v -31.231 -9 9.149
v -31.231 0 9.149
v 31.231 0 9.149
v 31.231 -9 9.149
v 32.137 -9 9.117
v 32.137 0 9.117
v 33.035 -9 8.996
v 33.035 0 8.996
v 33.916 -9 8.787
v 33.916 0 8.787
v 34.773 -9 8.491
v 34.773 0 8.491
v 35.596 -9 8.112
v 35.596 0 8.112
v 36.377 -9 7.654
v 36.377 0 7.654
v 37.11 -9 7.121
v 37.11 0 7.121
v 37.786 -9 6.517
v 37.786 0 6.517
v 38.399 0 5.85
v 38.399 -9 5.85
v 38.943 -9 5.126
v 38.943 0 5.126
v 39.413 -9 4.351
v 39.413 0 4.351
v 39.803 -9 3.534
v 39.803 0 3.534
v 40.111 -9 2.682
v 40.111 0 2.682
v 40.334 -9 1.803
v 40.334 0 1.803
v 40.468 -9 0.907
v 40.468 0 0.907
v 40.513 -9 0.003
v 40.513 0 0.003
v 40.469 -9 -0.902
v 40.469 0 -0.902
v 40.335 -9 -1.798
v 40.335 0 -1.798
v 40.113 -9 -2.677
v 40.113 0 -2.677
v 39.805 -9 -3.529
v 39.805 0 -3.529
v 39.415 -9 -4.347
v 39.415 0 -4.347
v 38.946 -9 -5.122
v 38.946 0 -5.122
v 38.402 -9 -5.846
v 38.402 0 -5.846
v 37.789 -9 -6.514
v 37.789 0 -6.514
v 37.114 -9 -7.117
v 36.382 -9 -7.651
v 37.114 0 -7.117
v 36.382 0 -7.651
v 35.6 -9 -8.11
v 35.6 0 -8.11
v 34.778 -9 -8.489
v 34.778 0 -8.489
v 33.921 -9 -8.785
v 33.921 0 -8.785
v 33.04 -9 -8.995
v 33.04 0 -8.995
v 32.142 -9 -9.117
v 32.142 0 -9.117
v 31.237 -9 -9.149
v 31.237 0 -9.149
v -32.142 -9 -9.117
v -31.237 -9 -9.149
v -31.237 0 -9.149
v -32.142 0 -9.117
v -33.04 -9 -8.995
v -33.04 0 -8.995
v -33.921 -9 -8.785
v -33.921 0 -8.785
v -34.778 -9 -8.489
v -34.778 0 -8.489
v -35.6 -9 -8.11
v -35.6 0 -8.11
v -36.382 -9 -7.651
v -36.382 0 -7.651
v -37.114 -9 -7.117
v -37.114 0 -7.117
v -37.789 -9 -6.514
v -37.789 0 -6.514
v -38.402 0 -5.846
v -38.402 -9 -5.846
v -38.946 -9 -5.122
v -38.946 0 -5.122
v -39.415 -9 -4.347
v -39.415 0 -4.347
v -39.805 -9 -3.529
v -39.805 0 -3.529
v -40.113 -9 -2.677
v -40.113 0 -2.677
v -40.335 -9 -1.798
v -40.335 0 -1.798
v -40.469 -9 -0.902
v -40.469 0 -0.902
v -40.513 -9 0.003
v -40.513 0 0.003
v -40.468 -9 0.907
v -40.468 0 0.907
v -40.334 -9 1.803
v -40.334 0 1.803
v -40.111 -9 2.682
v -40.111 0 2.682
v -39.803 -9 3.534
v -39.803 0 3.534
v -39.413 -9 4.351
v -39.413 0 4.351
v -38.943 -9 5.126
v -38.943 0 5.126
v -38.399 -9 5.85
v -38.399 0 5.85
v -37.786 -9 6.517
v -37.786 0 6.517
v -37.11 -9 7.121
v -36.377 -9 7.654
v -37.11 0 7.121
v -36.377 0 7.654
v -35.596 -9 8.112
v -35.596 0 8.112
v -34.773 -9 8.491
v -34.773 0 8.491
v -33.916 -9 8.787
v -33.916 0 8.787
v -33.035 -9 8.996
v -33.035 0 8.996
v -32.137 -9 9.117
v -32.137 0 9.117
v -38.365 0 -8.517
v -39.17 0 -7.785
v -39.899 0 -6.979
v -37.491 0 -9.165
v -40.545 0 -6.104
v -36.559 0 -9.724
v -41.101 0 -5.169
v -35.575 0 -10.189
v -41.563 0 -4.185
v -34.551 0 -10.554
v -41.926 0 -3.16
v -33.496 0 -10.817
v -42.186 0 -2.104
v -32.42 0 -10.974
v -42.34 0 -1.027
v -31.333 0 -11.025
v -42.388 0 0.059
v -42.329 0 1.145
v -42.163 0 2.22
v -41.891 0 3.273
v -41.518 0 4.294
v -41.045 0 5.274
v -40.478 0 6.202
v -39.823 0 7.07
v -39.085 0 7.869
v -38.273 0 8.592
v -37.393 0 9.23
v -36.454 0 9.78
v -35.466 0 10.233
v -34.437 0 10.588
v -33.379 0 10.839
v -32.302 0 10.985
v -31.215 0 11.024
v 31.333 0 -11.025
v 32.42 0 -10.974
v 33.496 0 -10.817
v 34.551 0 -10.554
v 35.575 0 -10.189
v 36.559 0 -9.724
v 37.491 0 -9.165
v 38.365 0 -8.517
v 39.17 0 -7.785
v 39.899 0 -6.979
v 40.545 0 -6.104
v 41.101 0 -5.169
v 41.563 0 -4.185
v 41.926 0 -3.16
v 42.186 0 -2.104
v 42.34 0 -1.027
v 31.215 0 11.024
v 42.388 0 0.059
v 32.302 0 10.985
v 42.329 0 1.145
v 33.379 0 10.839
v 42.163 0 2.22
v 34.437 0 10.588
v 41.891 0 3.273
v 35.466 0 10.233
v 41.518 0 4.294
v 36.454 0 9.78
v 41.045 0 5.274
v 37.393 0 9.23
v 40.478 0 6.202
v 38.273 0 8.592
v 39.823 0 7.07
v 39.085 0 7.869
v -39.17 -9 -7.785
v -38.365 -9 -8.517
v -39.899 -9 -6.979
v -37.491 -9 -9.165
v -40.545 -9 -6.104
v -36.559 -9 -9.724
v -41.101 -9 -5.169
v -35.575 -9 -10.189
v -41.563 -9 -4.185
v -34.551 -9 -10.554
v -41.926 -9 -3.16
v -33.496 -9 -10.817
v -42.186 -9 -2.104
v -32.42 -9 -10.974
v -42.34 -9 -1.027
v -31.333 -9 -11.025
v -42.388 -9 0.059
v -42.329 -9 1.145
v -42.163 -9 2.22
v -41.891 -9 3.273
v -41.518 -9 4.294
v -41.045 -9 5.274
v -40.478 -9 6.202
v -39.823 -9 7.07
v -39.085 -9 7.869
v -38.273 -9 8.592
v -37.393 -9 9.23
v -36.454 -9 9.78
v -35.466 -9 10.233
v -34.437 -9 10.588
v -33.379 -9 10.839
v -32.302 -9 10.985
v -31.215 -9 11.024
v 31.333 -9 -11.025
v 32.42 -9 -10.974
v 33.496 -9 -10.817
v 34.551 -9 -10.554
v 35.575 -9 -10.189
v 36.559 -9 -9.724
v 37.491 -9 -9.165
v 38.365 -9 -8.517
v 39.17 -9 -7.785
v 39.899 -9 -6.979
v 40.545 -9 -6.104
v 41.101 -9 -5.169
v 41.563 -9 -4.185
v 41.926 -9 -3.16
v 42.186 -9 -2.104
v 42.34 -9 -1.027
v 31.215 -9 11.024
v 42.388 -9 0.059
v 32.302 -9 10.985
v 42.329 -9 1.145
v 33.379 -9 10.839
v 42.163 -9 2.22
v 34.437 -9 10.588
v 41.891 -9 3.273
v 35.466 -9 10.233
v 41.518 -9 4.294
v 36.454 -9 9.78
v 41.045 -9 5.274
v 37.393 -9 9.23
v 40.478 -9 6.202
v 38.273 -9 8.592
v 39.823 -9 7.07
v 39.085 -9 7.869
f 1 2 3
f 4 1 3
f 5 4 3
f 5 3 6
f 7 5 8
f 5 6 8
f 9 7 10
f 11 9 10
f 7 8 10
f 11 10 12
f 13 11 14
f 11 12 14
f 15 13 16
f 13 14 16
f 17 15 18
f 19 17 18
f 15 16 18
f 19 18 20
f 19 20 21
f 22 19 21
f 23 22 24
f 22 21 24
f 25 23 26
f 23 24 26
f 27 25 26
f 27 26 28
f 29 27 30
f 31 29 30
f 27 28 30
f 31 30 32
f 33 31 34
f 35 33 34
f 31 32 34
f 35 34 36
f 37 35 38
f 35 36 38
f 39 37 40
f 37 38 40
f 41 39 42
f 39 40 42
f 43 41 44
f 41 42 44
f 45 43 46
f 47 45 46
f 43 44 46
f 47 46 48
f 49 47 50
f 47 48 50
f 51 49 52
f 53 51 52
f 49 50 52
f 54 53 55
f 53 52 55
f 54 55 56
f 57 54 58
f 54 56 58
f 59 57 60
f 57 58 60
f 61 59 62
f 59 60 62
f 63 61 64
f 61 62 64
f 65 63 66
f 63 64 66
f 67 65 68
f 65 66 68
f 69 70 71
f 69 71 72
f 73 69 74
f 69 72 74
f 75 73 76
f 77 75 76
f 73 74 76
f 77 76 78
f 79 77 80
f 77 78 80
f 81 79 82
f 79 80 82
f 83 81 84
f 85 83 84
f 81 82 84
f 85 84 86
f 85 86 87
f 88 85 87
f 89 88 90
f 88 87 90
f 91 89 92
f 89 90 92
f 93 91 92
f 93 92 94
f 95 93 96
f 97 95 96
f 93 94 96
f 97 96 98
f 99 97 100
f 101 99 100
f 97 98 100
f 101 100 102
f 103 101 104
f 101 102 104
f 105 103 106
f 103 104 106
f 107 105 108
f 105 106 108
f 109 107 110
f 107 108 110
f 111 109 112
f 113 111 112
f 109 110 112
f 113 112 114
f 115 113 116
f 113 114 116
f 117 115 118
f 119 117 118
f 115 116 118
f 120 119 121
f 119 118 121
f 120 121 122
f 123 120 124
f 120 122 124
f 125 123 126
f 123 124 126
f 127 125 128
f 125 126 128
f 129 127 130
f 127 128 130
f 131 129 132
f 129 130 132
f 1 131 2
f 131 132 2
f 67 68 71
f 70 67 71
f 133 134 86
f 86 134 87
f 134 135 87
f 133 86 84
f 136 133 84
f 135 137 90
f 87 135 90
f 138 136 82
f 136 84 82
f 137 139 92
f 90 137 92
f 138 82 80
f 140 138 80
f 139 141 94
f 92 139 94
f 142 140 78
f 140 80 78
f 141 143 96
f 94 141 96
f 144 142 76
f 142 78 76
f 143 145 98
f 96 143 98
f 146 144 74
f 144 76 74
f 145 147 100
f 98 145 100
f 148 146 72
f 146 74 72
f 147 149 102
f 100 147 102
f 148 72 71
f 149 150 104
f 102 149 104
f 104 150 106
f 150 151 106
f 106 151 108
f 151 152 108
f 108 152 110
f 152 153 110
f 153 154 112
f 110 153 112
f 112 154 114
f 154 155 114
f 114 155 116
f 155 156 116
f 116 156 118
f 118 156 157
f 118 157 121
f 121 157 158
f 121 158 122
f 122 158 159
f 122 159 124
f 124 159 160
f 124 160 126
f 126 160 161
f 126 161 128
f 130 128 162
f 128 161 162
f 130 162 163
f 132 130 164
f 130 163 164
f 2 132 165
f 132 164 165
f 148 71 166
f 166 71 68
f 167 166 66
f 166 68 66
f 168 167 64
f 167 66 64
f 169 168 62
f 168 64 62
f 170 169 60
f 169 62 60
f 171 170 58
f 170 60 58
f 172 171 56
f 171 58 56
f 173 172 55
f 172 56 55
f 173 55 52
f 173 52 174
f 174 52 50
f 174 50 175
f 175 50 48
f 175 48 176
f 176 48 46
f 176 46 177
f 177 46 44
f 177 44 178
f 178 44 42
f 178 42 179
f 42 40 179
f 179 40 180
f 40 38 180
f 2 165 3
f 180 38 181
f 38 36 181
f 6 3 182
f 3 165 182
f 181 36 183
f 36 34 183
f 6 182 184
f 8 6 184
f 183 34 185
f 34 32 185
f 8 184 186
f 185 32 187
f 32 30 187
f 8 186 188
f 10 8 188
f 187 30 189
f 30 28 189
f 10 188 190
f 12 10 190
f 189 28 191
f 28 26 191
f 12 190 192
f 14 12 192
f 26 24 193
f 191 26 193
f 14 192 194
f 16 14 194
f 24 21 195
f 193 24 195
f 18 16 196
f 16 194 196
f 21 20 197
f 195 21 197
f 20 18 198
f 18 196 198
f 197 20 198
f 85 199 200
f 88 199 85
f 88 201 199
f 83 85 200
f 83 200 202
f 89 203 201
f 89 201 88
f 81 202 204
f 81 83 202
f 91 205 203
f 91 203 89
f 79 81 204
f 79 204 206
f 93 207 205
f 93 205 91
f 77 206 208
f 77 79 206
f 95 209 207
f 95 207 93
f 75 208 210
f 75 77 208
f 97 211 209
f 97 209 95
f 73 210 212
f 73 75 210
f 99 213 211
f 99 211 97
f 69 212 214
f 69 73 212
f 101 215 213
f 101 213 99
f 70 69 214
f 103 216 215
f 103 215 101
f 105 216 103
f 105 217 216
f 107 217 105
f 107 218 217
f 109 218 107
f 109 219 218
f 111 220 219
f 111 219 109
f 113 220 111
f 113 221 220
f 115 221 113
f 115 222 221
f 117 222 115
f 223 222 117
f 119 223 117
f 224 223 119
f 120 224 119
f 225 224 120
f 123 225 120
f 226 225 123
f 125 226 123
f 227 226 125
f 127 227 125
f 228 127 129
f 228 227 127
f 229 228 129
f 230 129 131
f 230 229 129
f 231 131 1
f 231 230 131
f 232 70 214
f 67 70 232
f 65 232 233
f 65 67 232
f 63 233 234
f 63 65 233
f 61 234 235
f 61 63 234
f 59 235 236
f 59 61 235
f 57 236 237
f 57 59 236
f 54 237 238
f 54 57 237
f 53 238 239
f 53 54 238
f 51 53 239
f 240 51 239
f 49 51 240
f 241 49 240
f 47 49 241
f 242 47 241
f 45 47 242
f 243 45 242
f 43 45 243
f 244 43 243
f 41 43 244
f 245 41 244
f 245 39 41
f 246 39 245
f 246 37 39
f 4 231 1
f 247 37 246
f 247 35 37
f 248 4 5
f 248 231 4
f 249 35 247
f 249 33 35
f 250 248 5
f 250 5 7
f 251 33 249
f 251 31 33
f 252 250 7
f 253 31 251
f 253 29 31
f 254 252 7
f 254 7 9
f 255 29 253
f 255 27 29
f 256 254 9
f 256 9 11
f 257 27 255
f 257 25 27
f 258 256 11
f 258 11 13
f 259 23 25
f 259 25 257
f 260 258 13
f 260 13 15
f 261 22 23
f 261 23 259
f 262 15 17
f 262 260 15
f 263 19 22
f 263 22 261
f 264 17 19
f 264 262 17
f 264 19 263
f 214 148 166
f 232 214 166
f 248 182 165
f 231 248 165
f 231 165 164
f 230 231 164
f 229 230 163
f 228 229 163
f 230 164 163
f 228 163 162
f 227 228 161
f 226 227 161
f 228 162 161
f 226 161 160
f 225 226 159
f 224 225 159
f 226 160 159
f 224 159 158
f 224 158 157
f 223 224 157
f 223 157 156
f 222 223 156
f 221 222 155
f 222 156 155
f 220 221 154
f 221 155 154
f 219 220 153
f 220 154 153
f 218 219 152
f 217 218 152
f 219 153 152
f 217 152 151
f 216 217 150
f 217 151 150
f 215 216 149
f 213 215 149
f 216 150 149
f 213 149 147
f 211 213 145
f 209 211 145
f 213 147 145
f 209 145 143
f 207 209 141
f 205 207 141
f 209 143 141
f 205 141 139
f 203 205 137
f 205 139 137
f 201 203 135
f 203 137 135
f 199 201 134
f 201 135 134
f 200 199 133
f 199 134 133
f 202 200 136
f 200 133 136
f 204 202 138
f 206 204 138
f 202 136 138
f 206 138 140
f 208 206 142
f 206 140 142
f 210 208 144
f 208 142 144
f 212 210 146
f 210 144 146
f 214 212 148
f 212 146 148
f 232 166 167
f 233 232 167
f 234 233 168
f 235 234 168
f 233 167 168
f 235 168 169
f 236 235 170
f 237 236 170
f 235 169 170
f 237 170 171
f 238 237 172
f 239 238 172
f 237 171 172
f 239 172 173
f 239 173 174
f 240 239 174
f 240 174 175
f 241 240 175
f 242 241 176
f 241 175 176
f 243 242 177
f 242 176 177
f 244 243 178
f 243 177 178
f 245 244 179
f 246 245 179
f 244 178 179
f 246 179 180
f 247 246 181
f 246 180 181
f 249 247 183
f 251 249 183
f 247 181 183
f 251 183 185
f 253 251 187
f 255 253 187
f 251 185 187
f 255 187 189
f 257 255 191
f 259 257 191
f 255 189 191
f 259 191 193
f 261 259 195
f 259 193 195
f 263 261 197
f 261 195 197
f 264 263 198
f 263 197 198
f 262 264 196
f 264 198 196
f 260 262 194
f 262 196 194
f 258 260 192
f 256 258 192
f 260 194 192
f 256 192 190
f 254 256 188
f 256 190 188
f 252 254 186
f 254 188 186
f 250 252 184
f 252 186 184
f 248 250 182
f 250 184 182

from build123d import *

# Parameters (mm, degrees)
F1_DEPTH = 9


with BuildPart() as f1:
    # F0 (on Front) → F1 (new body)
    with BuildSketch(Plane.XZ):
        with BuildLine():
            ThreePointArc((31.333461, -11.025016), (42.388194, 0.059319), (31.214828, 11.024057))
            Line((31.214828, 11.024057), (0, 11.024057))
            Line((0, 11.024057), (-31.214828, 11.024057))
            ThreePointArc((-31.214828, 11.024057), (-42.388194, 0.059319), (-31.333461, -11.025016))
            Line((-31.333461, -11.025016), (0, -11.025016))
            Line((0, -11.025016), (31.333461, -11.025016))
        make_face()
        with BuildLine():
            ThreePointArc((31.231488, 9.149051), (40.513297, 0.002619), (31.236725, -9.149125))
            Line((31.236725, -9.149125), (0, -9.149125))
            Line((0, -9.149125), (-31.236725, -9.149125))
            ThreePointArc((-31.236725, -9.149125), (-40.513297, 0.002619), (-31.231488, 9.149051))
            Line((-31.231488, 9.149051), (0, 9.149051))
            Line((0, 9.149051), (31.231488, 9.149051))
        make_face(mode=Mode.SUBTRACT)
    extrude(amount=F1_DEPTH)


solid = f1.part
